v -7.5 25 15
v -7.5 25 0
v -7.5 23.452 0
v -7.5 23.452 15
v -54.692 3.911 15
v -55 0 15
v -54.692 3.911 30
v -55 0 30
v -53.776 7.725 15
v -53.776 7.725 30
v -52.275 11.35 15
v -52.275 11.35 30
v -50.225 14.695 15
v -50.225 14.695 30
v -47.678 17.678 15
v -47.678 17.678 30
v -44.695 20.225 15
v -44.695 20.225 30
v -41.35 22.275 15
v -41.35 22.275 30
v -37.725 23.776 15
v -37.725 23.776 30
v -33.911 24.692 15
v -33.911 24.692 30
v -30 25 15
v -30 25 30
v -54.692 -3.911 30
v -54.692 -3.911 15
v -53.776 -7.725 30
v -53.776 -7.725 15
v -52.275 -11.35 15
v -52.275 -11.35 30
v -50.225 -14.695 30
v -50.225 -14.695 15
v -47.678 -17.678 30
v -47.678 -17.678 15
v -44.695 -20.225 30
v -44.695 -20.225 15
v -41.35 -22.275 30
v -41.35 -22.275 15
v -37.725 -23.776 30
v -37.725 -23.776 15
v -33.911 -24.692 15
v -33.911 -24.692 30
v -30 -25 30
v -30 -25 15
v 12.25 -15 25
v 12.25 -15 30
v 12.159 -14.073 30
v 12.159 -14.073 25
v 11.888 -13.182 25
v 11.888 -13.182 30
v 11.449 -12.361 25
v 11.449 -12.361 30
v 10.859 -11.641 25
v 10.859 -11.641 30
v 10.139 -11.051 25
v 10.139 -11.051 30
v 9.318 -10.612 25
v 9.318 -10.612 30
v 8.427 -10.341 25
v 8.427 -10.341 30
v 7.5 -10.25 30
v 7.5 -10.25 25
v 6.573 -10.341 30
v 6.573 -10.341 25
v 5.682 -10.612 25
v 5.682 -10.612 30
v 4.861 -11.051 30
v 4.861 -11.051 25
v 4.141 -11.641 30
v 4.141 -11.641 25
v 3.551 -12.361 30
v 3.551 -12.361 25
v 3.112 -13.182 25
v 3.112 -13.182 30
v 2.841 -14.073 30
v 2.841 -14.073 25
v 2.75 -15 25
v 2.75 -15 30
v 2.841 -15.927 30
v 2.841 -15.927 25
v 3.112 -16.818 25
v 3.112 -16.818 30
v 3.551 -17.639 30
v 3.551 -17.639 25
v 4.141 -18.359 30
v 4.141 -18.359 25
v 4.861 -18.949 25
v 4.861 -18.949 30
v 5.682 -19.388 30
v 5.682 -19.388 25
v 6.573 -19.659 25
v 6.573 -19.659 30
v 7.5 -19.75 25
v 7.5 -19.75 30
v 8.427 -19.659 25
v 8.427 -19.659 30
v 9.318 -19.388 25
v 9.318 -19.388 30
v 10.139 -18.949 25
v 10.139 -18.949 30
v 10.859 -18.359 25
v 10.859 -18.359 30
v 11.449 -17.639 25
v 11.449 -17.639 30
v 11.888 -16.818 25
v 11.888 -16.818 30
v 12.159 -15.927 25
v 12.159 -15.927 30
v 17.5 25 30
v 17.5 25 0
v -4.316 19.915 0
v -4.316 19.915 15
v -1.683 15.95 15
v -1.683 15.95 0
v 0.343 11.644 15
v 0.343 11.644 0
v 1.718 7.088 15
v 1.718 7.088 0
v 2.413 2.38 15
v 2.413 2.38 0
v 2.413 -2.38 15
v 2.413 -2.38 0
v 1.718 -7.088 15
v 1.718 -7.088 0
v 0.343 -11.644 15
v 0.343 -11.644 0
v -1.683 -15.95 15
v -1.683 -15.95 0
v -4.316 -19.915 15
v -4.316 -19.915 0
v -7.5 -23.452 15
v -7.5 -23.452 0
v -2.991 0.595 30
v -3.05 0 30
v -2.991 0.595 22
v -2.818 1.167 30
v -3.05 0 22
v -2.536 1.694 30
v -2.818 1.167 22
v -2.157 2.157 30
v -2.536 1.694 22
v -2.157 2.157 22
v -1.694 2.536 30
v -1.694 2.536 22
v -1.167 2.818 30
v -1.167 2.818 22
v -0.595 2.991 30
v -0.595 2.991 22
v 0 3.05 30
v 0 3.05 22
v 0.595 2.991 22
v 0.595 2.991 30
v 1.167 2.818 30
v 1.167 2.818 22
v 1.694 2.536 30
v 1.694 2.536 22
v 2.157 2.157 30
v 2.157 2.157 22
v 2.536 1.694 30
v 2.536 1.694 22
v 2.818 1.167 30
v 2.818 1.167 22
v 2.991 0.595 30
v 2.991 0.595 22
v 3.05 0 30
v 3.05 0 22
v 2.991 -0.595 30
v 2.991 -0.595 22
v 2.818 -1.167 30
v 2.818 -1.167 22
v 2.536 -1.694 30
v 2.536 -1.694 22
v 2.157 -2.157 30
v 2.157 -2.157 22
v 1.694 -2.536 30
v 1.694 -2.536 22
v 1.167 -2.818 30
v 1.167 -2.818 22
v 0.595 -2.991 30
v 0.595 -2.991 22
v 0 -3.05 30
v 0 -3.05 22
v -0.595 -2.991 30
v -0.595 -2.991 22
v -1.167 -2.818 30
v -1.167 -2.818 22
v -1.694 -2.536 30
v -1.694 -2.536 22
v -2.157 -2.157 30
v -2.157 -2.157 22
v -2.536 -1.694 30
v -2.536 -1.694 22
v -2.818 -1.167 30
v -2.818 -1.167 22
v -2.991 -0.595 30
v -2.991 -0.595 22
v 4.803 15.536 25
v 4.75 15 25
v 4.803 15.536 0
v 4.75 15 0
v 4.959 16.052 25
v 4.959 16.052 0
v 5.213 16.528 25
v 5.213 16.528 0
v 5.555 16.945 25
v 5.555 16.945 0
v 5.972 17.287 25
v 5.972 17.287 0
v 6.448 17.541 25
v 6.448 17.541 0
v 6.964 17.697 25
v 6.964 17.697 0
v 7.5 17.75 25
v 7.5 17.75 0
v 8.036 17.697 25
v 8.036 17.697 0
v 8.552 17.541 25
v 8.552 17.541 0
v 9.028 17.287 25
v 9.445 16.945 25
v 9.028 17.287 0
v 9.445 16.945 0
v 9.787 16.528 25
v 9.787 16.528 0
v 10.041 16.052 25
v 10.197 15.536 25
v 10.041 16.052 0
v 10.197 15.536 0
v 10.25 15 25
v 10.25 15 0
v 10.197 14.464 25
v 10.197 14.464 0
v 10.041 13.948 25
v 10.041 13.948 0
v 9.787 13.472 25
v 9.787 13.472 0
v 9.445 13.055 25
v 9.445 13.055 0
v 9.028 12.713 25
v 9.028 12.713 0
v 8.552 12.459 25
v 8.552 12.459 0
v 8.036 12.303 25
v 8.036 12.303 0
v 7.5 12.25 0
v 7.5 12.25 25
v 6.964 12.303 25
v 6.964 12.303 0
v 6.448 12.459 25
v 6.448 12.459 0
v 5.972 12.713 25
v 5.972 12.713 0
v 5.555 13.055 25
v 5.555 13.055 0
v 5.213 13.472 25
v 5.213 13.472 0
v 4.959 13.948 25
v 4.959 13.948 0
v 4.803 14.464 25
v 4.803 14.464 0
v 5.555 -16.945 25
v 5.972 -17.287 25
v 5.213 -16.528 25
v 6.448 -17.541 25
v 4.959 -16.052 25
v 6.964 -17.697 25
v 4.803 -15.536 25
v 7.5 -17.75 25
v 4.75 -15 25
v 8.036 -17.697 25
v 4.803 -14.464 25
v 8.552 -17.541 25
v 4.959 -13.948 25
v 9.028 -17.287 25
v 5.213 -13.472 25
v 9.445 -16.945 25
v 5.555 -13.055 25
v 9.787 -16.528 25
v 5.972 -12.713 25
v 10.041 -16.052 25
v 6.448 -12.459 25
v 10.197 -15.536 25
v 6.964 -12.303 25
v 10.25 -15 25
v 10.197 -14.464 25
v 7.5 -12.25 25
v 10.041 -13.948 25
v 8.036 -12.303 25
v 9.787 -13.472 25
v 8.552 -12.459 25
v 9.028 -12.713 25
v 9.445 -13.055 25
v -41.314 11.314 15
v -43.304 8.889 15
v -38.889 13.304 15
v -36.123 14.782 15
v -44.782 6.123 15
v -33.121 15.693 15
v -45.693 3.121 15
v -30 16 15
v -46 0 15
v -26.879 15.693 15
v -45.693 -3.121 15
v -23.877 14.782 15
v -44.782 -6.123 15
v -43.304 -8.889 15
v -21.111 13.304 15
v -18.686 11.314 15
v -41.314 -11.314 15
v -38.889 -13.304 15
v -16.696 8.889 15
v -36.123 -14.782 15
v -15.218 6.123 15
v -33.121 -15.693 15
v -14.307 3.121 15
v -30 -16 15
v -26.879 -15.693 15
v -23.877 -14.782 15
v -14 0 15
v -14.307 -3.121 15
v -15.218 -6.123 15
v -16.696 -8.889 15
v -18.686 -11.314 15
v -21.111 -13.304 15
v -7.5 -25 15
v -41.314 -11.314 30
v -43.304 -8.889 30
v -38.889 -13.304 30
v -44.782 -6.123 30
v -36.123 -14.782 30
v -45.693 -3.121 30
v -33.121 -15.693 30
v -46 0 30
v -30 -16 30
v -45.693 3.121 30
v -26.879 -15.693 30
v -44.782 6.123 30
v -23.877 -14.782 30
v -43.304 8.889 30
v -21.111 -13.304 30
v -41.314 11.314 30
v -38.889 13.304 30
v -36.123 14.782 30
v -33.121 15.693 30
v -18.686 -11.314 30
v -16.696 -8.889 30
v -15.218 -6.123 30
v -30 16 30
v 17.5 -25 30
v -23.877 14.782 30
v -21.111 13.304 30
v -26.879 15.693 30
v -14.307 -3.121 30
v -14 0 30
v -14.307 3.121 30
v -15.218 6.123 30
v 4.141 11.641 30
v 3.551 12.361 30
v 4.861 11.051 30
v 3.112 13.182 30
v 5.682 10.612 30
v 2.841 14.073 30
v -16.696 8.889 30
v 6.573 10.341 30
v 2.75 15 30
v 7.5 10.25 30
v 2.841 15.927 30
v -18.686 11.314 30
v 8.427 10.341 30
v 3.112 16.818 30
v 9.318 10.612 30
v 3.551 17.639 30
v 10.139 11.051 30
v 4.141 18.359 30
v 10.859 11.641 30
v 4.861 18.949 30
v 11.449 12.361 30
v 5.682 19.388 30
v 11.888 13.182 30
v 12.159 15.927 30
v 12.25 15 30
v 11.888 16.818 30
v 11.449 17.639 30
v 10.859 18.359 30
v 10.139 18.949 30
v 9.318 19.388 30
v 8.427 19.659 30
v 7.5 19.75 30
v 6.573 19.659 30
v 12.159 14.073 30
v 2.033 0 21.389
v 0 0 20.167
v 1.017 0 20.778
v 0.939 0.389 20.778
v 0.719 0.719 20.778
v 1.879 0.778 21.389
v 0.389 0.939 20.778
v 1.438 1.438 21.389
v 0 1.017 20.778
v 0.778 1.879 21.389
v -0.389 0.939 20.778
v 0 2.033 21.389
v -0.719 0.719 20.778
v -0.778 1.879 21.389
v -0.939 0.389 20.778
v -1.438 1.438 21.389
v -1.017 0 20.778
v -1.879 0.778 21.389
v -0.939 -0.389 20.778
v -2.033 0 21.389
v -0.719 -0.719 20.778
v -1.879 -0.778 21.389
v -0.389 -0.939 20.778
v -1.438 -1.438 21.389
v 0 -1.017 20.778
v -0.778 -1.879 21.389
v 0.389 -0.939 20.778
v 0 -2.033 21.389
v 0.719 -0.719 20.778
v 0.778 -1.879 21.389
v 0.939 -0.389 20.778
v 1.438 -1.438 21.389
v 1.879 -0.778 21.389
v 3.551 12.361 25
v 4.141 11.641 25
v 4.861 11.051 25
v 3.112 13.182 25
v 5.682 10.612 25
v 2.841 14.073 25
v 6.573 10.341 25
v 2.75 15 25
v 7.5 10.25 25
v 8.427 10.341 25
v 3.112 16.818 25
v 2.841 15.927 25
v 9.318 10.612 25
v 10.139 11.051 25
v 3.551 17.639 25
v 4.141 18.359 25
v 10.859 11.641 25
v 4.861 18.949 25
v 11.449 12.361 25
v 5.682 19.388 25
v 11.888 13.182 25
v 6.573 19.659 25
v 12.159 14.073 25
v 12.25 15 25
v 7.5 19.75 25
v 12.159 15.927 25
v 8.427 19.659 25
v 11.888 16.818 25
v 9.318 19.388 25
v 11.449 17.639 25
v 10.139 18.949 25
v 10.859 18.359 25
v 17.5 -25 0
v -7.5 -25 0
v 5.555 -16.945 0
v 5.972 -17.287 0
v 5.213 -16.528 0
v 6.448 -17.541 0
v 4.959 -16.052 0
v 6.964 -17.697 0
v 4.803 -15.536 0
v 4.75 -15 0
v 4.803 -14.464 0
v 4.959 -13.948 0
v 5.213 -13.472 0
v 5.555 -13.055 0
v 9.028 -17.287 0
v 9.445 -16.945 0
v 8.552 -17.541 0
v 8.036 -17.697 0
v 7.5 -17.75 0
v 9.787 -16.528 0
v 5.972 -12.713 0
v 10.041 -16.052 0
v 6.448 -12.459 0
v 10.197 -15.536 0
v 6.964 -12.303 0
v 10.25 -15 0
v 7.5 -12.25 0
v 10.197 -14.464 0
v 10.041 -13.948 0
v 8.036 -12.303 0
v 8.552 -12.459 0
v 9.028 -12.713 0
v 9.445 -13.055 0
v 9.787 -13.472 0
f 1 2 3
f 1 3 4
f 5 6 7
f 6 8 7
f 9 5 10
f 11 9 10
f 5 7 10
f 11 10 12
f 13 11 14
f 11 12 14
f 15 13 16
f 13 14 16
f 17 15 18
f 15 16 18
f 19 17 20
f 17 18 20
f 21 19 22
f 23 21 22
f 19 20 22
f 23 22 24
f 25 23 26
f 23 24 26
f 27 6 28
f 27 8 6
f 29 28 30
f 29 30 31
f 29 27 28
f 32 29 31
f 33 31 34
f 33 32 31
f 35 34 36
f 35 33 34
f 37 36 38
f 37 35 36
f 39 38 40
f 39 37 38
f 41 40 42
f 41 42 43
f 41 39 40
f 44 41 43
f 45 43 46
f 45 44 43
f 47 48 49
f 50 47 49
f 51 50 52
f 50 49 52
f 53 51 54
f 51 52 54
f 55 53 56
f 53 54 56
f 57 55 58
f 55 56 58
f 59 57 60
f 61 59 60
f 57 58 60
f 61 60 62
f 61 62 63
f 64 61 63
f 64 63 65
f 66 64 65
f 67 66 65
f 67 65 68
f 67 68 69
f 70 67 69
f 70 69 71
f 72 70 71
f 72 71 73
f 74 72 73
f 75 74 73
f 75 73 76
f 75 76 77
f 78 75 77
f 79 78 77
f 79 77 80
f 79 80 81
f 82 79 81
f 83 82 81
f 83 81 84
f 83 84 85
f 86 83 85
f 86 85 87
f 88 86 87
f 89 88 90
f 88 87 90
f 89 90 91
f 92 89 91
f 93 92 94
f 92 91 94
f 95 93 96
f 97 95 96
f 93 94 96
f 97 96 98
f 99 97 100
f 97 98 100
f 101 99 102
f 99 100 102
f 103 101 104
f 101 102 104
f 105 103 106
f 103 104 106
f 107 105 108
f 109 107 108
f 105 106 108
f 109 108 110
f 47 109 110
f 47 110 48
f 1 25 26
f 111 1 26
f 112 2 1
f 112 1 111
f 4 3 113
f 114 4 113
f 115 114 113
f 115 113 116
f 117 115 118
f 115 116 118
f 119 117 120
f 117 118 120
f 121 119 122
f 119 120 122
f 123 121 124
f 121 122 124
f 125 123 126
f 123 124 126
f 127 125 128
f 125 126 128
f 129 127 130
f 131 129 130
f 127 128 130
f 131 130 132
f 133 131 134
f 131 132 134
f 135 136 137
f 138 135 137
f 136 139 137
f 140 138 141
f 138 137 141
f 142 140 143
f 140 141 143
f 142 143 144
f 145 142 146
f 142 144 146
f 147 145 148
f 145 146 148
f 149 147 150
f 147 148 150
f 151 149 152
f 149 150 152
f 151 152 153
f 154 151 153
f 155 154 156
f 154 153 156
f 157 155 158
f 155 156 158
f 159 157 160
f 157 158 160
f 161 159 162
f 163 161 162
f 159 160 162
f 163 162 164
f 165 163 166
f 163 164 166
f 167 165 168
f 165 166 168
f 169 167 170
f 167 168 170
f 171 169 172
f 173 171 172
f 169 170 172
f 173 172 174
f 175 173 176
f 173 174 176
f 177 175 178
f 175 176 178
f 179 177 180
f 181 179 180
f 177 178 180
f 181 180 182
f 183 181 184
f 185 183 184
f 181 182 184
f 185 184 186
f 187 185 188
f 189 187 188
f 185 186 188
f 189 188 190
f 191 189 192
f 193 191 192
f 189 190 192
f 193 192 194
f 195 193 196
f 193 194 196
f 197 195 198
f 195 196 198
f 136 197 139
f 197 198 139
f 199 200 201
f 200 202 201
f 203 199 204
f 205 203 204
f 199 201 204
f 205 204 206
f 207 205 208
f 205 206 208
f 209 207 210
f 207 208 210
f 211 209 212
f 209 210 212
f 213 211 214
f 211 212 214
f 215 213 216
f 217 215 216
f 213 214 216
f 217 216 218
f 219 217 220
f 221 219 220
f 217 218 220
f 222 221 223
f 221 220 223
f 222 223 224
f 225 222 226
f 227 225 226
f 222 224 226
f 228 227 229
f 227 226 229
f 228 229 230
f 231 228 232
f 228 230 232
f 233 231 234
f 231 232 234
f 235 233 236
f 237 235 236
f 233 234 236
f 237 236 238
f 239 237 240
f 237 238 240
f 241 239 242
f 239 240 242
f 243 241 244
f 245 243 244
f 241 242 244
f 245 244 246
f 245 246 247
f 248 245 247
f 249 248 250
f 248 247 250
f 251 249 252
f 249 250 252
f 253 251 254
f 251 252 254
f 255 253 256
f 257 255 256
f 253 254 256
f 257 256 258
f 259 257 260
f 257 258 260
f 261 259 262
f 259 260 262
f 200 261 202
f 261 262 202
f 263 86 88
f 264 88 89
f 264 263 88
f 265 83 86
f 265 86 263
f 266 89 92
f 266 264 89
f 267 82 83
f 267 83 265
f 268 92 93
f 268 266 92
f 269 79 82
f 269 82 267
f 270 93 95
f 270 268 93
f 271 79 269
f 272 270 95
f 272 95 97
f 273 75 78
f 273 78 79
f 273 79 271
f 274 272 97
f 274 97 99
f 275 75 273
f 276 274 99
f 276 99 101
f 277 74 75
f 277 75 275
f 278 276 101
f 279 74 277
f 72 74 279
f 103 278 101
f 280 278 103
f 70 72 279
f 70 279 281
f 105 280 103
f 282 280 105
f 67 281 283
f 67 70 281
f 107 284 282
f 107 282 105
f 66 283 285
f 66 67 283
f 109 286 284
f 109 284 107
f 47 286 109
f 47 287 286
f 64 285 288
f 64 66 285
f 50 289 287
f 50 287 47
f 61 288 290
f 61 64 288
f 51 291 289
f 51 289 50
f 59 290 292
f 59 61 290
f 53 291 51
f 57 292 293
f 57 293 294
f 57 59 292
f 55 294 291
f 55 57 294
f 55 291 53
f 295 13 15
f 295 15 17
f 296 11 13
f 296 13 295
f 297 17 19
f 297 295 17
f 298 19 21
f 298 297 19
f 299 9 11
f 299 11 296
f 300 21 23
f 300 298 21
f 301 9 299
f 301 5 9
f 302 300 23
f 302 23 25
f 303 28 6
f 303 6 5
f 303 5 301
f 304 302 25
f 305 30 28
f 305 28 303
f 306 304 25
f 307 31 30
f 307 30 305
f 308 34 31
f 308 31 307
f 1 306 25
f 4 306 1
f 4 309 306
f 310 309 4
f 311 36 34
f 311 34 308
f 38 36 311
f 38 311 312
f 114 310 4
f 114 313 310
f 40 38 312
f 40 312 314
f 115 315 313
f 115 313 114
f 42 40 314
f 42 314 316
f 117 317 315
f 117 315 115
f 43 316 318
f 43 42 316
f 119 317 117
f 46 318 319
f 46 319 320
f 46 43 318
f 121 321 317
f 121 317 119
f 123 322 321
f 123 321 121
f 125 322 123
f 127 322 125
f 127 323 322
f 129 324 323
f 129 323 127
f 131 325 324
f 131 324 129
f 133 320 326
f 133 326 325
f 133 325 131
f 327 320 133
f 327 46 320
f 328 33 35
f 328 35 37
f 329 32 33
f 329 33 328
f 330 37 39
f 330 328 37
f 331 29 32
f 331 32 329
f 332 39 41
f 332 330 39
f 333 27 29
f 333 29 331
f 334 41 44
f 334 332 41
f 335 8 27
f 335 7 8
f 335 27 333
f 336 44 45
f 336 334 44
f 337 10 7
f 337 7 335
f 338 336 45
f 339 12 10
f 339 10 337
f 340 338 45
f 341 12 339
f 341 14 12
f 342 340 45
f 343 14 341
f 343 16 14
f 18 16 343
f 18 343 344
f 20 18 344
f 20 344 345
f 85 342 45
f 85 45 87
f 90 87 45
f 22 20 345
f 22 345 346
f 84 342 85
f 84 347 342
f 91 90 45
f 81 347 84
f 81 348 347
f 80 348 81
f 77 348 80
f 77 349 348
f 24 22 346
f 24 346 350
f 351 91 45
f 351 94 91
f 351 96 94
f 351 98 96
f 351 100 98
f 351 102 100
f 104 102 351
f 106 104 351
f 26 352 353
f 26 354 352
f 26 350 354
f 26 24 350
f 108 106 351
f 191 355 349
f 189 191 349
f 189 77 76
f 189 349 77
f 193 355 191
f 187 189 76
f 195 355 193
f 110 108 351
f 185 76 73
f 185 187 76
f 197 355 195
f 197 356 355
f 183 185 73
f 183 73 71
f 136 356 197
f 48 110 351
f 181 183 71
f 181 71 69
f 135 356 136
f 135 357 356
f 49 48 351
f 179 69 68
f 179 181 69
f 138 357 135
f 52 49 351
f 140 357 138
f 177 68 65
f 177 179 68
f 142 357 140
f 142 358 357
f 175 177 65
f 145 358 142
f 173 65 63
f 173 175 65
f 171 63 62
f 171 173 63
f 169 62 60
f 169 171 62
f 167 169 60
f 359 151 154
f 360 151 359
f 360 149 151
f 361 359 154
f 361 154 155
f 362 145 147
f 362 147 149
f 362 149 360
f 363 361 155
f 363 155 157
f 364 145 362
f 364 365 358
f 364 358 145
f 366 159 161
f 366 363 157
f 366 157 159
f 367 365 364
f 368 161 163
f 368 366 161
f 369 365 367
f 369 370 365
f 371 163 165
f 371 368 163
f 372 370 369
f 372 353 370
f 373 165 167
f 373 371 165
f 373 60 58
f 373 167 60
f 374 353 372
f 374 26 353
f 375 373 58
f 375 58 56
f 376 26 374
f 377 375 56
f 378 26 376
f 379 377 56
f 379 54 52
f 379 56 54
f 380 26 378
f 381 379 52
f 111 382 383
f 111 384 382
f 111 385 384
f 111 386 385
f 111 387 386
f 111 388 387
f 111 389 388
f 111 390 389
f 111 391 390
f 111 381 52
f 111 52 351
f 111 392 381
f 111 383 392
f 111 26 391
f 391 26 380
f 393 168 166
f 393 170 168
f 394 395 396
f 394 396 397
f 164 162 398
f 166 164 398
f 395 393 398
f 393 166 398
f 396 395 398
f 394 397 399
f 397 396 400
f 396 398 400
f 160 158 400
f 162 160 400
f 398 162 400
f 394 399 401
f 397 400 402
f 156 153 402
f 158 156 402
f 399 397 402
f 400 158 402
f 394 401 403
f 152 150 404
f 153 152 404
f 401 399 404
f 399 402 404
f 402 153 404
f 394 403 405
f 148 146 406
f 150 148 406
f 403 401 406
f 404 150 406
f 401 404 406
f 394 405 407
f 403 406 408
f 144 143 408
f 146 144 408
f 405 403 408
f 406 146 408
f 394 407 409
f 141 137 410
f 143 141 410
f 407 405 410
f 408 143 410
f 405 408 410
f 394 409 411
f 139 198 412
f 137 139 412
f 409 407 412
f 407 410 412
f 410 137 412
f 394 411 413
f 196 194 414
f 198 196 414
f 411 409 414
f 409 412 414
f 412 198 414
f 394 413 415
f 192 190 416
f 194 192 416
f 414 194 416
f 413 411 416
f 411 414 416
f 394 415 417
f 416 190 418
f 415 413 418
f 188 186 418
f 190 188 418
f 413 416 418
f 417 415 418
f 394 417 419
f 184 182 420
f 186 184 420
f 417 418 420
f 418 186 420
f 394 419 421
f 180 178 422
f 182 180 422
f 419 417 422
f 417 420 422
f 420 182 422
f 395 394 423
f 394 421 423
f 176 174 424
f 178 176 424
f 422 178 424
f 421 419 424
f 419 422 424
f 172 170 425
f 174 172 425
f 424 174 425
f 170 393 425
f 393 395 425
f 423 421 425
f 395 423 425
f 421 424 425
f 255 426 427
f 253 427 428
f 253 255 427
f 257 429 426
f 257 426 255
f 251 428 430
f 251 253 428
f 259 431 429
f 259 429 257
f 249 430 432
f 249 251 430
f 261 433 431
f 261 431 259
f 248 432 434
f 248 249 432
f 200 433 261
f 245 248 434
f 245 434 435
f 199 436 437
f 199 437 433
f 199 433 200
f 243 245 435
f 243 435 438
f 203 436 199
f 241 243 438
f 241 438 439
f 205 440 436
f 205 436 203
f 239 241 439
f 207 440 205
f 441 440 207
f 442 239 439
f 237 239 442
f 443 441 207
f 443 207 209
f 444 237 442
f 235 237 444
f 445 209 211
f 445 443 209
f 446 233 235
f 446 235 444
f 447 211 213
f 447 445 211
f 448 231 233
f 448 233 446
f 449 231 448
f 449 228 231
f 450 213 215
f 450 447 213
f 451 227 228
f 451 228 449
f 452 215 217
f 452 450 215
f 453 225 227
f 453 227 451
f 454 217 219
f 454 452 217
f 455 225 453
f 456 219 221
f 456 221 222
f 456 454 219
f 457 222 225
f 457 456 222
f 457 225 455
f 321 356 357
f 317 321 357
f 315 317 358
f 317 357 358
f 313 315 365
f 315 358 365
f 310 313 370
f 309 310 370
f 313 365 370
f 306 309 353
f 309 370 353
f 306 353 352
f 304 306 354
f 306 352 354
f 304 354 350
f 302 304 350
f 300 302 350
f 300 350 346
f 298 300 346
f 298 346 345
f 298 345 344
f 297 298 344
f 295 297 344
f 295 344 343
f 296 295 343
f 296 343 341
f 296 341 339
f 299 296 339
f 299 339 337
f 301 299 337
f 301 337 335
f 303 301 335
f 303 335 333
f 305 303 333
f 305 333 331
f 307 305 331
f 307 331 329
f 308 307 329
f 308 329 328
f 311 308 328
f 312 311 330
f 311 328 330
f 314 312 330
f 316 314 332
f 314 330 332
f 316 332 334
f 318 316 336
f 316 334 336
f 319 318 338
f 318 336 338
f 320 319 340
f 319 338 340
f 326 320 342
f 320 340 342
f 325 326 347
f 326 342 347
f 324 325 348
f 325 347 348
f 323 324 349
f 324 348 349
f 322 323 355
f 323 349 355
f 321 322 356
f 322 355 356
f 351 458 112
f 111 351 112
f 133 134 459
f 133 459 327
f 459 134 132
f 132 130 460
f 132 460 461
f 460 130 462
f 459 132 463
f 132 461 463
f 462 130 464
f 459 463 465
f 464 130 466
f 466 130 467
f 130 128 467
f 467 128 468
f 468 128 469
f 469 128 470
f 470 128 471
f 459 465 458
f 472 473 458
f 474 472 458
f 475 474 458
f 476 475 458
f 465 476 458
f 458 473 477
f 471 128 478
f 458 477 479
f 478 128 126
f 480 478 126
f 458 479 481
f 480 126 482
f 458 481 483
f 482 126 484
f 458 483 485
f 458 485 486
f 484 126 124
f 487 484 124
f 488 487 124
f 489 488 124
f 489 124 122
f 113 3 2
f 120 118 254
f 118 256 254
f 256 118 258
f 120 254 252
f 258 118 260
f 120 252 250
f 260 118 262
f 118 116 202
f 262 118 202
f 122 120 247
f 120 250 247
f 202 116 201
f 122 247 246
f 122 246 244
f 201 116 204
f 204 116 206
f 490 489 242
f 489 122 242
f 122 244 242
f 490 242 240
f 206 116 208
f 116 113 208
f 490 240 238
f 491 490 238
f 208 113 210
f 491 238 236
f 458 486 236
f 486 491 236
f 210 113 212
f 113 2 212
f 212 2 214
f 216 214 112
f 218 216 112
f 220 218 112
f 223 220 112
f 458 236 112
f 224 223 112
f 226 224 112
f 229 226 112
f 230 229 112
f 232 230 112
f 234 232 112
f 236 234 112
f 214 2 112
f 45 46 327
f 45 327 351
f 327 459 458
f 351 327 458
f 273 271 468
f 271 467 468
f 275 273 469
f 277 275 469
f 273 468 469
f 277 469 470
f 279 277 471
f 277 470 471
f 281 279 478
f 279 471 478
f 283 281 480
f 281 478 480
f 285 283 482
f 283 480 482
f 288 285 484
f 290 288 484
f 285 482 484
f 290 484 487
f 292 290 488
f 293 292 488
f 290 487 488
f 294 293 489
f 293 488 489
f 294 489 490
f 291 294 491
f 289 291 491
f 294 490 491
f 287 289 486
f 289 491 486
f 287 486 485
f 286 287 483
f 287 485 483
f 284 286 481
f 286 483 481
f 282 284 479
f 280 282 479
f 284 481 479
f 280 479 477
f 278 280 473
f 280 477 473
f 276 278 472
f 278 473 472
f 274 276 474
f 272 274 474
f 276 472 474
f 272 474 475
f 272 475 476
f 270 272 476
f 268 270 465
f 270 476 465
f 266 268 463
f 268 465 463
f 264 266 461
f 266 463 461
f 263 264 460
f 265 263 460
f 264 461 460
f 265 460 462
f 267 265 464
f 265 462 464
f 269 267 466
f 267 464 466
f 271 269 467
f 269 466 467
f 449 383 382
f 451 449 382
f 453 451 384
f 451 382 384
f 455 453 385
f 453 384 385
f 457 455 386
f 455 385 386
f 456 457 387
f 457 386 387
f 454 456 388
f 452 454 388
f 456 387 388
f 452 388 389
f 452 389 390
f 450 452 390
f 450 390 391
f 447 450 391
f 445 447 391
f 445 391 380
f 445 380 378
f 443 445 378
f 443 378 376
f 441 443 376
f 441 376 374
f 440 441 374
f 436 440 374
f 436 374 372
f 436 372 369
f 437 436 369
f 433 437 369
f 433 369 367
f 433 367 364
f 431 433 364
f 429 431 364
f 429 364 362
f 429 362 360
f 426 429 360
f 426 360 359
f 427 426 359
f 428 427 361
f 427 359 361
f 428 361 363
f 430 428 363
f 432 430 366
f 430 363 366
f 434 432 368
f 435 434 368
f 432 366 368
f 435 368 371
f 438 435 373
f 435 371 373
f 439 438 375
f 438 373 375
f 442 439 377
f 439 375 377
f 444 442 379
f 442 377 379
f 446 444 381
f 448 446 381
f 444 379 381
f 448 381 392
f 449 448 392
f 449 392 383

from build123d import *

# Parameters (mm, degrees)
F0_W            = 72.5
F0_H            = 50
F1_DEPTH        = 30
F2_R            = 16
F3_DEPTH        = 30.001
F5_D            = 6.1
F5_DEPTH        = 8
F5_TIP          = 1.832624888
F6_R            = 32.5
F7_DEPTH        = 15
F8_R            = 24.99999
F10_D           = 5.5
F10_CBORE_D     = 9.5
F10_CBORE_DEPTH = 5
F11_W           = 1.7334403427
F11_H           = 15
F12_DEPTH       = 50.001


# Not quite as in the source:
# - a fillet or chamfer is up to 0.001 mm smaller than in the source, because OpenCascade refuses the exact size


with BuildPart() as f1:
    # F0 (on Top) → F1 (new body)
    with BuildSketch(Plane.XY):
        with Locations((-18.75, 0)):
            Rectangle(F0_W, F0_H)
    extrude(amount=F1_DEPTH)

    # F2 (on face) → F3 (cut, through all)
    with BuildSketch(Plane.XY.offset(30)):
        with Locations((-30, 0)):
            Circle(F2_R)
    extrude(amount=-F3_DEPTH, mode=Mode.SUBTRACT)

    # F5
    with Locations(Plane.XY.offset(30)):
        with Locations((0, 0)):
            Hole(F5_D / 2, depth=F5_DEPTH)
            with Locations((0, 0, -(F5_DEPTH + F5_TIP / 2))):  # 118° drill point
                Cone(0, F5_D / 2, F5_TIP, mode=Mode.SUBTRACT)

    # F6 (on face) → F7 (cut)
    with BuildSketch(Plane(origin=(0, 0, 0), x_dir=(1, 0, 0), z_dir=(0, 0, -1))):
        with Locations((-30, 0)):
            Circle(F6_R)
    extrude(amount=-F7_DEPTH, mode=Mode.SUBTRACT)

    # F8 (radius 25 in the source; OpenCascade refuses exactly that, so slightly less here)
    f8_edges = [f1.edges().sort_by_distance(p)[0] for p in [
        (-55, -25, 15),
        (-55, 25, 15),
    ]]
    fillet(f8_edges, radius=F8_R)

    # F10 (through all)
    with Locations(Plane.XY.offset(30)):
        with Locations((7.5, 15), (7.5, -15)):
            CounterBoreHole(F10_D / 2, F10_CBORE_D / 2, F10_CBORE_DEPTH)

    # F11 (on face) → F12 (cut, through all)
    with BuildSketch(Plane(origin=(0, 25, 0), x_dir=(-1, 0, 0), z_dir=(0, 1, 0))):
        with Locations((8.3667201714, 7.5)):
            Rectangle(F11_W, F11_H)
    extrude(amount=-F12_DEPTH, mode=Mode.SUBTRACT)


solid = f1.part
